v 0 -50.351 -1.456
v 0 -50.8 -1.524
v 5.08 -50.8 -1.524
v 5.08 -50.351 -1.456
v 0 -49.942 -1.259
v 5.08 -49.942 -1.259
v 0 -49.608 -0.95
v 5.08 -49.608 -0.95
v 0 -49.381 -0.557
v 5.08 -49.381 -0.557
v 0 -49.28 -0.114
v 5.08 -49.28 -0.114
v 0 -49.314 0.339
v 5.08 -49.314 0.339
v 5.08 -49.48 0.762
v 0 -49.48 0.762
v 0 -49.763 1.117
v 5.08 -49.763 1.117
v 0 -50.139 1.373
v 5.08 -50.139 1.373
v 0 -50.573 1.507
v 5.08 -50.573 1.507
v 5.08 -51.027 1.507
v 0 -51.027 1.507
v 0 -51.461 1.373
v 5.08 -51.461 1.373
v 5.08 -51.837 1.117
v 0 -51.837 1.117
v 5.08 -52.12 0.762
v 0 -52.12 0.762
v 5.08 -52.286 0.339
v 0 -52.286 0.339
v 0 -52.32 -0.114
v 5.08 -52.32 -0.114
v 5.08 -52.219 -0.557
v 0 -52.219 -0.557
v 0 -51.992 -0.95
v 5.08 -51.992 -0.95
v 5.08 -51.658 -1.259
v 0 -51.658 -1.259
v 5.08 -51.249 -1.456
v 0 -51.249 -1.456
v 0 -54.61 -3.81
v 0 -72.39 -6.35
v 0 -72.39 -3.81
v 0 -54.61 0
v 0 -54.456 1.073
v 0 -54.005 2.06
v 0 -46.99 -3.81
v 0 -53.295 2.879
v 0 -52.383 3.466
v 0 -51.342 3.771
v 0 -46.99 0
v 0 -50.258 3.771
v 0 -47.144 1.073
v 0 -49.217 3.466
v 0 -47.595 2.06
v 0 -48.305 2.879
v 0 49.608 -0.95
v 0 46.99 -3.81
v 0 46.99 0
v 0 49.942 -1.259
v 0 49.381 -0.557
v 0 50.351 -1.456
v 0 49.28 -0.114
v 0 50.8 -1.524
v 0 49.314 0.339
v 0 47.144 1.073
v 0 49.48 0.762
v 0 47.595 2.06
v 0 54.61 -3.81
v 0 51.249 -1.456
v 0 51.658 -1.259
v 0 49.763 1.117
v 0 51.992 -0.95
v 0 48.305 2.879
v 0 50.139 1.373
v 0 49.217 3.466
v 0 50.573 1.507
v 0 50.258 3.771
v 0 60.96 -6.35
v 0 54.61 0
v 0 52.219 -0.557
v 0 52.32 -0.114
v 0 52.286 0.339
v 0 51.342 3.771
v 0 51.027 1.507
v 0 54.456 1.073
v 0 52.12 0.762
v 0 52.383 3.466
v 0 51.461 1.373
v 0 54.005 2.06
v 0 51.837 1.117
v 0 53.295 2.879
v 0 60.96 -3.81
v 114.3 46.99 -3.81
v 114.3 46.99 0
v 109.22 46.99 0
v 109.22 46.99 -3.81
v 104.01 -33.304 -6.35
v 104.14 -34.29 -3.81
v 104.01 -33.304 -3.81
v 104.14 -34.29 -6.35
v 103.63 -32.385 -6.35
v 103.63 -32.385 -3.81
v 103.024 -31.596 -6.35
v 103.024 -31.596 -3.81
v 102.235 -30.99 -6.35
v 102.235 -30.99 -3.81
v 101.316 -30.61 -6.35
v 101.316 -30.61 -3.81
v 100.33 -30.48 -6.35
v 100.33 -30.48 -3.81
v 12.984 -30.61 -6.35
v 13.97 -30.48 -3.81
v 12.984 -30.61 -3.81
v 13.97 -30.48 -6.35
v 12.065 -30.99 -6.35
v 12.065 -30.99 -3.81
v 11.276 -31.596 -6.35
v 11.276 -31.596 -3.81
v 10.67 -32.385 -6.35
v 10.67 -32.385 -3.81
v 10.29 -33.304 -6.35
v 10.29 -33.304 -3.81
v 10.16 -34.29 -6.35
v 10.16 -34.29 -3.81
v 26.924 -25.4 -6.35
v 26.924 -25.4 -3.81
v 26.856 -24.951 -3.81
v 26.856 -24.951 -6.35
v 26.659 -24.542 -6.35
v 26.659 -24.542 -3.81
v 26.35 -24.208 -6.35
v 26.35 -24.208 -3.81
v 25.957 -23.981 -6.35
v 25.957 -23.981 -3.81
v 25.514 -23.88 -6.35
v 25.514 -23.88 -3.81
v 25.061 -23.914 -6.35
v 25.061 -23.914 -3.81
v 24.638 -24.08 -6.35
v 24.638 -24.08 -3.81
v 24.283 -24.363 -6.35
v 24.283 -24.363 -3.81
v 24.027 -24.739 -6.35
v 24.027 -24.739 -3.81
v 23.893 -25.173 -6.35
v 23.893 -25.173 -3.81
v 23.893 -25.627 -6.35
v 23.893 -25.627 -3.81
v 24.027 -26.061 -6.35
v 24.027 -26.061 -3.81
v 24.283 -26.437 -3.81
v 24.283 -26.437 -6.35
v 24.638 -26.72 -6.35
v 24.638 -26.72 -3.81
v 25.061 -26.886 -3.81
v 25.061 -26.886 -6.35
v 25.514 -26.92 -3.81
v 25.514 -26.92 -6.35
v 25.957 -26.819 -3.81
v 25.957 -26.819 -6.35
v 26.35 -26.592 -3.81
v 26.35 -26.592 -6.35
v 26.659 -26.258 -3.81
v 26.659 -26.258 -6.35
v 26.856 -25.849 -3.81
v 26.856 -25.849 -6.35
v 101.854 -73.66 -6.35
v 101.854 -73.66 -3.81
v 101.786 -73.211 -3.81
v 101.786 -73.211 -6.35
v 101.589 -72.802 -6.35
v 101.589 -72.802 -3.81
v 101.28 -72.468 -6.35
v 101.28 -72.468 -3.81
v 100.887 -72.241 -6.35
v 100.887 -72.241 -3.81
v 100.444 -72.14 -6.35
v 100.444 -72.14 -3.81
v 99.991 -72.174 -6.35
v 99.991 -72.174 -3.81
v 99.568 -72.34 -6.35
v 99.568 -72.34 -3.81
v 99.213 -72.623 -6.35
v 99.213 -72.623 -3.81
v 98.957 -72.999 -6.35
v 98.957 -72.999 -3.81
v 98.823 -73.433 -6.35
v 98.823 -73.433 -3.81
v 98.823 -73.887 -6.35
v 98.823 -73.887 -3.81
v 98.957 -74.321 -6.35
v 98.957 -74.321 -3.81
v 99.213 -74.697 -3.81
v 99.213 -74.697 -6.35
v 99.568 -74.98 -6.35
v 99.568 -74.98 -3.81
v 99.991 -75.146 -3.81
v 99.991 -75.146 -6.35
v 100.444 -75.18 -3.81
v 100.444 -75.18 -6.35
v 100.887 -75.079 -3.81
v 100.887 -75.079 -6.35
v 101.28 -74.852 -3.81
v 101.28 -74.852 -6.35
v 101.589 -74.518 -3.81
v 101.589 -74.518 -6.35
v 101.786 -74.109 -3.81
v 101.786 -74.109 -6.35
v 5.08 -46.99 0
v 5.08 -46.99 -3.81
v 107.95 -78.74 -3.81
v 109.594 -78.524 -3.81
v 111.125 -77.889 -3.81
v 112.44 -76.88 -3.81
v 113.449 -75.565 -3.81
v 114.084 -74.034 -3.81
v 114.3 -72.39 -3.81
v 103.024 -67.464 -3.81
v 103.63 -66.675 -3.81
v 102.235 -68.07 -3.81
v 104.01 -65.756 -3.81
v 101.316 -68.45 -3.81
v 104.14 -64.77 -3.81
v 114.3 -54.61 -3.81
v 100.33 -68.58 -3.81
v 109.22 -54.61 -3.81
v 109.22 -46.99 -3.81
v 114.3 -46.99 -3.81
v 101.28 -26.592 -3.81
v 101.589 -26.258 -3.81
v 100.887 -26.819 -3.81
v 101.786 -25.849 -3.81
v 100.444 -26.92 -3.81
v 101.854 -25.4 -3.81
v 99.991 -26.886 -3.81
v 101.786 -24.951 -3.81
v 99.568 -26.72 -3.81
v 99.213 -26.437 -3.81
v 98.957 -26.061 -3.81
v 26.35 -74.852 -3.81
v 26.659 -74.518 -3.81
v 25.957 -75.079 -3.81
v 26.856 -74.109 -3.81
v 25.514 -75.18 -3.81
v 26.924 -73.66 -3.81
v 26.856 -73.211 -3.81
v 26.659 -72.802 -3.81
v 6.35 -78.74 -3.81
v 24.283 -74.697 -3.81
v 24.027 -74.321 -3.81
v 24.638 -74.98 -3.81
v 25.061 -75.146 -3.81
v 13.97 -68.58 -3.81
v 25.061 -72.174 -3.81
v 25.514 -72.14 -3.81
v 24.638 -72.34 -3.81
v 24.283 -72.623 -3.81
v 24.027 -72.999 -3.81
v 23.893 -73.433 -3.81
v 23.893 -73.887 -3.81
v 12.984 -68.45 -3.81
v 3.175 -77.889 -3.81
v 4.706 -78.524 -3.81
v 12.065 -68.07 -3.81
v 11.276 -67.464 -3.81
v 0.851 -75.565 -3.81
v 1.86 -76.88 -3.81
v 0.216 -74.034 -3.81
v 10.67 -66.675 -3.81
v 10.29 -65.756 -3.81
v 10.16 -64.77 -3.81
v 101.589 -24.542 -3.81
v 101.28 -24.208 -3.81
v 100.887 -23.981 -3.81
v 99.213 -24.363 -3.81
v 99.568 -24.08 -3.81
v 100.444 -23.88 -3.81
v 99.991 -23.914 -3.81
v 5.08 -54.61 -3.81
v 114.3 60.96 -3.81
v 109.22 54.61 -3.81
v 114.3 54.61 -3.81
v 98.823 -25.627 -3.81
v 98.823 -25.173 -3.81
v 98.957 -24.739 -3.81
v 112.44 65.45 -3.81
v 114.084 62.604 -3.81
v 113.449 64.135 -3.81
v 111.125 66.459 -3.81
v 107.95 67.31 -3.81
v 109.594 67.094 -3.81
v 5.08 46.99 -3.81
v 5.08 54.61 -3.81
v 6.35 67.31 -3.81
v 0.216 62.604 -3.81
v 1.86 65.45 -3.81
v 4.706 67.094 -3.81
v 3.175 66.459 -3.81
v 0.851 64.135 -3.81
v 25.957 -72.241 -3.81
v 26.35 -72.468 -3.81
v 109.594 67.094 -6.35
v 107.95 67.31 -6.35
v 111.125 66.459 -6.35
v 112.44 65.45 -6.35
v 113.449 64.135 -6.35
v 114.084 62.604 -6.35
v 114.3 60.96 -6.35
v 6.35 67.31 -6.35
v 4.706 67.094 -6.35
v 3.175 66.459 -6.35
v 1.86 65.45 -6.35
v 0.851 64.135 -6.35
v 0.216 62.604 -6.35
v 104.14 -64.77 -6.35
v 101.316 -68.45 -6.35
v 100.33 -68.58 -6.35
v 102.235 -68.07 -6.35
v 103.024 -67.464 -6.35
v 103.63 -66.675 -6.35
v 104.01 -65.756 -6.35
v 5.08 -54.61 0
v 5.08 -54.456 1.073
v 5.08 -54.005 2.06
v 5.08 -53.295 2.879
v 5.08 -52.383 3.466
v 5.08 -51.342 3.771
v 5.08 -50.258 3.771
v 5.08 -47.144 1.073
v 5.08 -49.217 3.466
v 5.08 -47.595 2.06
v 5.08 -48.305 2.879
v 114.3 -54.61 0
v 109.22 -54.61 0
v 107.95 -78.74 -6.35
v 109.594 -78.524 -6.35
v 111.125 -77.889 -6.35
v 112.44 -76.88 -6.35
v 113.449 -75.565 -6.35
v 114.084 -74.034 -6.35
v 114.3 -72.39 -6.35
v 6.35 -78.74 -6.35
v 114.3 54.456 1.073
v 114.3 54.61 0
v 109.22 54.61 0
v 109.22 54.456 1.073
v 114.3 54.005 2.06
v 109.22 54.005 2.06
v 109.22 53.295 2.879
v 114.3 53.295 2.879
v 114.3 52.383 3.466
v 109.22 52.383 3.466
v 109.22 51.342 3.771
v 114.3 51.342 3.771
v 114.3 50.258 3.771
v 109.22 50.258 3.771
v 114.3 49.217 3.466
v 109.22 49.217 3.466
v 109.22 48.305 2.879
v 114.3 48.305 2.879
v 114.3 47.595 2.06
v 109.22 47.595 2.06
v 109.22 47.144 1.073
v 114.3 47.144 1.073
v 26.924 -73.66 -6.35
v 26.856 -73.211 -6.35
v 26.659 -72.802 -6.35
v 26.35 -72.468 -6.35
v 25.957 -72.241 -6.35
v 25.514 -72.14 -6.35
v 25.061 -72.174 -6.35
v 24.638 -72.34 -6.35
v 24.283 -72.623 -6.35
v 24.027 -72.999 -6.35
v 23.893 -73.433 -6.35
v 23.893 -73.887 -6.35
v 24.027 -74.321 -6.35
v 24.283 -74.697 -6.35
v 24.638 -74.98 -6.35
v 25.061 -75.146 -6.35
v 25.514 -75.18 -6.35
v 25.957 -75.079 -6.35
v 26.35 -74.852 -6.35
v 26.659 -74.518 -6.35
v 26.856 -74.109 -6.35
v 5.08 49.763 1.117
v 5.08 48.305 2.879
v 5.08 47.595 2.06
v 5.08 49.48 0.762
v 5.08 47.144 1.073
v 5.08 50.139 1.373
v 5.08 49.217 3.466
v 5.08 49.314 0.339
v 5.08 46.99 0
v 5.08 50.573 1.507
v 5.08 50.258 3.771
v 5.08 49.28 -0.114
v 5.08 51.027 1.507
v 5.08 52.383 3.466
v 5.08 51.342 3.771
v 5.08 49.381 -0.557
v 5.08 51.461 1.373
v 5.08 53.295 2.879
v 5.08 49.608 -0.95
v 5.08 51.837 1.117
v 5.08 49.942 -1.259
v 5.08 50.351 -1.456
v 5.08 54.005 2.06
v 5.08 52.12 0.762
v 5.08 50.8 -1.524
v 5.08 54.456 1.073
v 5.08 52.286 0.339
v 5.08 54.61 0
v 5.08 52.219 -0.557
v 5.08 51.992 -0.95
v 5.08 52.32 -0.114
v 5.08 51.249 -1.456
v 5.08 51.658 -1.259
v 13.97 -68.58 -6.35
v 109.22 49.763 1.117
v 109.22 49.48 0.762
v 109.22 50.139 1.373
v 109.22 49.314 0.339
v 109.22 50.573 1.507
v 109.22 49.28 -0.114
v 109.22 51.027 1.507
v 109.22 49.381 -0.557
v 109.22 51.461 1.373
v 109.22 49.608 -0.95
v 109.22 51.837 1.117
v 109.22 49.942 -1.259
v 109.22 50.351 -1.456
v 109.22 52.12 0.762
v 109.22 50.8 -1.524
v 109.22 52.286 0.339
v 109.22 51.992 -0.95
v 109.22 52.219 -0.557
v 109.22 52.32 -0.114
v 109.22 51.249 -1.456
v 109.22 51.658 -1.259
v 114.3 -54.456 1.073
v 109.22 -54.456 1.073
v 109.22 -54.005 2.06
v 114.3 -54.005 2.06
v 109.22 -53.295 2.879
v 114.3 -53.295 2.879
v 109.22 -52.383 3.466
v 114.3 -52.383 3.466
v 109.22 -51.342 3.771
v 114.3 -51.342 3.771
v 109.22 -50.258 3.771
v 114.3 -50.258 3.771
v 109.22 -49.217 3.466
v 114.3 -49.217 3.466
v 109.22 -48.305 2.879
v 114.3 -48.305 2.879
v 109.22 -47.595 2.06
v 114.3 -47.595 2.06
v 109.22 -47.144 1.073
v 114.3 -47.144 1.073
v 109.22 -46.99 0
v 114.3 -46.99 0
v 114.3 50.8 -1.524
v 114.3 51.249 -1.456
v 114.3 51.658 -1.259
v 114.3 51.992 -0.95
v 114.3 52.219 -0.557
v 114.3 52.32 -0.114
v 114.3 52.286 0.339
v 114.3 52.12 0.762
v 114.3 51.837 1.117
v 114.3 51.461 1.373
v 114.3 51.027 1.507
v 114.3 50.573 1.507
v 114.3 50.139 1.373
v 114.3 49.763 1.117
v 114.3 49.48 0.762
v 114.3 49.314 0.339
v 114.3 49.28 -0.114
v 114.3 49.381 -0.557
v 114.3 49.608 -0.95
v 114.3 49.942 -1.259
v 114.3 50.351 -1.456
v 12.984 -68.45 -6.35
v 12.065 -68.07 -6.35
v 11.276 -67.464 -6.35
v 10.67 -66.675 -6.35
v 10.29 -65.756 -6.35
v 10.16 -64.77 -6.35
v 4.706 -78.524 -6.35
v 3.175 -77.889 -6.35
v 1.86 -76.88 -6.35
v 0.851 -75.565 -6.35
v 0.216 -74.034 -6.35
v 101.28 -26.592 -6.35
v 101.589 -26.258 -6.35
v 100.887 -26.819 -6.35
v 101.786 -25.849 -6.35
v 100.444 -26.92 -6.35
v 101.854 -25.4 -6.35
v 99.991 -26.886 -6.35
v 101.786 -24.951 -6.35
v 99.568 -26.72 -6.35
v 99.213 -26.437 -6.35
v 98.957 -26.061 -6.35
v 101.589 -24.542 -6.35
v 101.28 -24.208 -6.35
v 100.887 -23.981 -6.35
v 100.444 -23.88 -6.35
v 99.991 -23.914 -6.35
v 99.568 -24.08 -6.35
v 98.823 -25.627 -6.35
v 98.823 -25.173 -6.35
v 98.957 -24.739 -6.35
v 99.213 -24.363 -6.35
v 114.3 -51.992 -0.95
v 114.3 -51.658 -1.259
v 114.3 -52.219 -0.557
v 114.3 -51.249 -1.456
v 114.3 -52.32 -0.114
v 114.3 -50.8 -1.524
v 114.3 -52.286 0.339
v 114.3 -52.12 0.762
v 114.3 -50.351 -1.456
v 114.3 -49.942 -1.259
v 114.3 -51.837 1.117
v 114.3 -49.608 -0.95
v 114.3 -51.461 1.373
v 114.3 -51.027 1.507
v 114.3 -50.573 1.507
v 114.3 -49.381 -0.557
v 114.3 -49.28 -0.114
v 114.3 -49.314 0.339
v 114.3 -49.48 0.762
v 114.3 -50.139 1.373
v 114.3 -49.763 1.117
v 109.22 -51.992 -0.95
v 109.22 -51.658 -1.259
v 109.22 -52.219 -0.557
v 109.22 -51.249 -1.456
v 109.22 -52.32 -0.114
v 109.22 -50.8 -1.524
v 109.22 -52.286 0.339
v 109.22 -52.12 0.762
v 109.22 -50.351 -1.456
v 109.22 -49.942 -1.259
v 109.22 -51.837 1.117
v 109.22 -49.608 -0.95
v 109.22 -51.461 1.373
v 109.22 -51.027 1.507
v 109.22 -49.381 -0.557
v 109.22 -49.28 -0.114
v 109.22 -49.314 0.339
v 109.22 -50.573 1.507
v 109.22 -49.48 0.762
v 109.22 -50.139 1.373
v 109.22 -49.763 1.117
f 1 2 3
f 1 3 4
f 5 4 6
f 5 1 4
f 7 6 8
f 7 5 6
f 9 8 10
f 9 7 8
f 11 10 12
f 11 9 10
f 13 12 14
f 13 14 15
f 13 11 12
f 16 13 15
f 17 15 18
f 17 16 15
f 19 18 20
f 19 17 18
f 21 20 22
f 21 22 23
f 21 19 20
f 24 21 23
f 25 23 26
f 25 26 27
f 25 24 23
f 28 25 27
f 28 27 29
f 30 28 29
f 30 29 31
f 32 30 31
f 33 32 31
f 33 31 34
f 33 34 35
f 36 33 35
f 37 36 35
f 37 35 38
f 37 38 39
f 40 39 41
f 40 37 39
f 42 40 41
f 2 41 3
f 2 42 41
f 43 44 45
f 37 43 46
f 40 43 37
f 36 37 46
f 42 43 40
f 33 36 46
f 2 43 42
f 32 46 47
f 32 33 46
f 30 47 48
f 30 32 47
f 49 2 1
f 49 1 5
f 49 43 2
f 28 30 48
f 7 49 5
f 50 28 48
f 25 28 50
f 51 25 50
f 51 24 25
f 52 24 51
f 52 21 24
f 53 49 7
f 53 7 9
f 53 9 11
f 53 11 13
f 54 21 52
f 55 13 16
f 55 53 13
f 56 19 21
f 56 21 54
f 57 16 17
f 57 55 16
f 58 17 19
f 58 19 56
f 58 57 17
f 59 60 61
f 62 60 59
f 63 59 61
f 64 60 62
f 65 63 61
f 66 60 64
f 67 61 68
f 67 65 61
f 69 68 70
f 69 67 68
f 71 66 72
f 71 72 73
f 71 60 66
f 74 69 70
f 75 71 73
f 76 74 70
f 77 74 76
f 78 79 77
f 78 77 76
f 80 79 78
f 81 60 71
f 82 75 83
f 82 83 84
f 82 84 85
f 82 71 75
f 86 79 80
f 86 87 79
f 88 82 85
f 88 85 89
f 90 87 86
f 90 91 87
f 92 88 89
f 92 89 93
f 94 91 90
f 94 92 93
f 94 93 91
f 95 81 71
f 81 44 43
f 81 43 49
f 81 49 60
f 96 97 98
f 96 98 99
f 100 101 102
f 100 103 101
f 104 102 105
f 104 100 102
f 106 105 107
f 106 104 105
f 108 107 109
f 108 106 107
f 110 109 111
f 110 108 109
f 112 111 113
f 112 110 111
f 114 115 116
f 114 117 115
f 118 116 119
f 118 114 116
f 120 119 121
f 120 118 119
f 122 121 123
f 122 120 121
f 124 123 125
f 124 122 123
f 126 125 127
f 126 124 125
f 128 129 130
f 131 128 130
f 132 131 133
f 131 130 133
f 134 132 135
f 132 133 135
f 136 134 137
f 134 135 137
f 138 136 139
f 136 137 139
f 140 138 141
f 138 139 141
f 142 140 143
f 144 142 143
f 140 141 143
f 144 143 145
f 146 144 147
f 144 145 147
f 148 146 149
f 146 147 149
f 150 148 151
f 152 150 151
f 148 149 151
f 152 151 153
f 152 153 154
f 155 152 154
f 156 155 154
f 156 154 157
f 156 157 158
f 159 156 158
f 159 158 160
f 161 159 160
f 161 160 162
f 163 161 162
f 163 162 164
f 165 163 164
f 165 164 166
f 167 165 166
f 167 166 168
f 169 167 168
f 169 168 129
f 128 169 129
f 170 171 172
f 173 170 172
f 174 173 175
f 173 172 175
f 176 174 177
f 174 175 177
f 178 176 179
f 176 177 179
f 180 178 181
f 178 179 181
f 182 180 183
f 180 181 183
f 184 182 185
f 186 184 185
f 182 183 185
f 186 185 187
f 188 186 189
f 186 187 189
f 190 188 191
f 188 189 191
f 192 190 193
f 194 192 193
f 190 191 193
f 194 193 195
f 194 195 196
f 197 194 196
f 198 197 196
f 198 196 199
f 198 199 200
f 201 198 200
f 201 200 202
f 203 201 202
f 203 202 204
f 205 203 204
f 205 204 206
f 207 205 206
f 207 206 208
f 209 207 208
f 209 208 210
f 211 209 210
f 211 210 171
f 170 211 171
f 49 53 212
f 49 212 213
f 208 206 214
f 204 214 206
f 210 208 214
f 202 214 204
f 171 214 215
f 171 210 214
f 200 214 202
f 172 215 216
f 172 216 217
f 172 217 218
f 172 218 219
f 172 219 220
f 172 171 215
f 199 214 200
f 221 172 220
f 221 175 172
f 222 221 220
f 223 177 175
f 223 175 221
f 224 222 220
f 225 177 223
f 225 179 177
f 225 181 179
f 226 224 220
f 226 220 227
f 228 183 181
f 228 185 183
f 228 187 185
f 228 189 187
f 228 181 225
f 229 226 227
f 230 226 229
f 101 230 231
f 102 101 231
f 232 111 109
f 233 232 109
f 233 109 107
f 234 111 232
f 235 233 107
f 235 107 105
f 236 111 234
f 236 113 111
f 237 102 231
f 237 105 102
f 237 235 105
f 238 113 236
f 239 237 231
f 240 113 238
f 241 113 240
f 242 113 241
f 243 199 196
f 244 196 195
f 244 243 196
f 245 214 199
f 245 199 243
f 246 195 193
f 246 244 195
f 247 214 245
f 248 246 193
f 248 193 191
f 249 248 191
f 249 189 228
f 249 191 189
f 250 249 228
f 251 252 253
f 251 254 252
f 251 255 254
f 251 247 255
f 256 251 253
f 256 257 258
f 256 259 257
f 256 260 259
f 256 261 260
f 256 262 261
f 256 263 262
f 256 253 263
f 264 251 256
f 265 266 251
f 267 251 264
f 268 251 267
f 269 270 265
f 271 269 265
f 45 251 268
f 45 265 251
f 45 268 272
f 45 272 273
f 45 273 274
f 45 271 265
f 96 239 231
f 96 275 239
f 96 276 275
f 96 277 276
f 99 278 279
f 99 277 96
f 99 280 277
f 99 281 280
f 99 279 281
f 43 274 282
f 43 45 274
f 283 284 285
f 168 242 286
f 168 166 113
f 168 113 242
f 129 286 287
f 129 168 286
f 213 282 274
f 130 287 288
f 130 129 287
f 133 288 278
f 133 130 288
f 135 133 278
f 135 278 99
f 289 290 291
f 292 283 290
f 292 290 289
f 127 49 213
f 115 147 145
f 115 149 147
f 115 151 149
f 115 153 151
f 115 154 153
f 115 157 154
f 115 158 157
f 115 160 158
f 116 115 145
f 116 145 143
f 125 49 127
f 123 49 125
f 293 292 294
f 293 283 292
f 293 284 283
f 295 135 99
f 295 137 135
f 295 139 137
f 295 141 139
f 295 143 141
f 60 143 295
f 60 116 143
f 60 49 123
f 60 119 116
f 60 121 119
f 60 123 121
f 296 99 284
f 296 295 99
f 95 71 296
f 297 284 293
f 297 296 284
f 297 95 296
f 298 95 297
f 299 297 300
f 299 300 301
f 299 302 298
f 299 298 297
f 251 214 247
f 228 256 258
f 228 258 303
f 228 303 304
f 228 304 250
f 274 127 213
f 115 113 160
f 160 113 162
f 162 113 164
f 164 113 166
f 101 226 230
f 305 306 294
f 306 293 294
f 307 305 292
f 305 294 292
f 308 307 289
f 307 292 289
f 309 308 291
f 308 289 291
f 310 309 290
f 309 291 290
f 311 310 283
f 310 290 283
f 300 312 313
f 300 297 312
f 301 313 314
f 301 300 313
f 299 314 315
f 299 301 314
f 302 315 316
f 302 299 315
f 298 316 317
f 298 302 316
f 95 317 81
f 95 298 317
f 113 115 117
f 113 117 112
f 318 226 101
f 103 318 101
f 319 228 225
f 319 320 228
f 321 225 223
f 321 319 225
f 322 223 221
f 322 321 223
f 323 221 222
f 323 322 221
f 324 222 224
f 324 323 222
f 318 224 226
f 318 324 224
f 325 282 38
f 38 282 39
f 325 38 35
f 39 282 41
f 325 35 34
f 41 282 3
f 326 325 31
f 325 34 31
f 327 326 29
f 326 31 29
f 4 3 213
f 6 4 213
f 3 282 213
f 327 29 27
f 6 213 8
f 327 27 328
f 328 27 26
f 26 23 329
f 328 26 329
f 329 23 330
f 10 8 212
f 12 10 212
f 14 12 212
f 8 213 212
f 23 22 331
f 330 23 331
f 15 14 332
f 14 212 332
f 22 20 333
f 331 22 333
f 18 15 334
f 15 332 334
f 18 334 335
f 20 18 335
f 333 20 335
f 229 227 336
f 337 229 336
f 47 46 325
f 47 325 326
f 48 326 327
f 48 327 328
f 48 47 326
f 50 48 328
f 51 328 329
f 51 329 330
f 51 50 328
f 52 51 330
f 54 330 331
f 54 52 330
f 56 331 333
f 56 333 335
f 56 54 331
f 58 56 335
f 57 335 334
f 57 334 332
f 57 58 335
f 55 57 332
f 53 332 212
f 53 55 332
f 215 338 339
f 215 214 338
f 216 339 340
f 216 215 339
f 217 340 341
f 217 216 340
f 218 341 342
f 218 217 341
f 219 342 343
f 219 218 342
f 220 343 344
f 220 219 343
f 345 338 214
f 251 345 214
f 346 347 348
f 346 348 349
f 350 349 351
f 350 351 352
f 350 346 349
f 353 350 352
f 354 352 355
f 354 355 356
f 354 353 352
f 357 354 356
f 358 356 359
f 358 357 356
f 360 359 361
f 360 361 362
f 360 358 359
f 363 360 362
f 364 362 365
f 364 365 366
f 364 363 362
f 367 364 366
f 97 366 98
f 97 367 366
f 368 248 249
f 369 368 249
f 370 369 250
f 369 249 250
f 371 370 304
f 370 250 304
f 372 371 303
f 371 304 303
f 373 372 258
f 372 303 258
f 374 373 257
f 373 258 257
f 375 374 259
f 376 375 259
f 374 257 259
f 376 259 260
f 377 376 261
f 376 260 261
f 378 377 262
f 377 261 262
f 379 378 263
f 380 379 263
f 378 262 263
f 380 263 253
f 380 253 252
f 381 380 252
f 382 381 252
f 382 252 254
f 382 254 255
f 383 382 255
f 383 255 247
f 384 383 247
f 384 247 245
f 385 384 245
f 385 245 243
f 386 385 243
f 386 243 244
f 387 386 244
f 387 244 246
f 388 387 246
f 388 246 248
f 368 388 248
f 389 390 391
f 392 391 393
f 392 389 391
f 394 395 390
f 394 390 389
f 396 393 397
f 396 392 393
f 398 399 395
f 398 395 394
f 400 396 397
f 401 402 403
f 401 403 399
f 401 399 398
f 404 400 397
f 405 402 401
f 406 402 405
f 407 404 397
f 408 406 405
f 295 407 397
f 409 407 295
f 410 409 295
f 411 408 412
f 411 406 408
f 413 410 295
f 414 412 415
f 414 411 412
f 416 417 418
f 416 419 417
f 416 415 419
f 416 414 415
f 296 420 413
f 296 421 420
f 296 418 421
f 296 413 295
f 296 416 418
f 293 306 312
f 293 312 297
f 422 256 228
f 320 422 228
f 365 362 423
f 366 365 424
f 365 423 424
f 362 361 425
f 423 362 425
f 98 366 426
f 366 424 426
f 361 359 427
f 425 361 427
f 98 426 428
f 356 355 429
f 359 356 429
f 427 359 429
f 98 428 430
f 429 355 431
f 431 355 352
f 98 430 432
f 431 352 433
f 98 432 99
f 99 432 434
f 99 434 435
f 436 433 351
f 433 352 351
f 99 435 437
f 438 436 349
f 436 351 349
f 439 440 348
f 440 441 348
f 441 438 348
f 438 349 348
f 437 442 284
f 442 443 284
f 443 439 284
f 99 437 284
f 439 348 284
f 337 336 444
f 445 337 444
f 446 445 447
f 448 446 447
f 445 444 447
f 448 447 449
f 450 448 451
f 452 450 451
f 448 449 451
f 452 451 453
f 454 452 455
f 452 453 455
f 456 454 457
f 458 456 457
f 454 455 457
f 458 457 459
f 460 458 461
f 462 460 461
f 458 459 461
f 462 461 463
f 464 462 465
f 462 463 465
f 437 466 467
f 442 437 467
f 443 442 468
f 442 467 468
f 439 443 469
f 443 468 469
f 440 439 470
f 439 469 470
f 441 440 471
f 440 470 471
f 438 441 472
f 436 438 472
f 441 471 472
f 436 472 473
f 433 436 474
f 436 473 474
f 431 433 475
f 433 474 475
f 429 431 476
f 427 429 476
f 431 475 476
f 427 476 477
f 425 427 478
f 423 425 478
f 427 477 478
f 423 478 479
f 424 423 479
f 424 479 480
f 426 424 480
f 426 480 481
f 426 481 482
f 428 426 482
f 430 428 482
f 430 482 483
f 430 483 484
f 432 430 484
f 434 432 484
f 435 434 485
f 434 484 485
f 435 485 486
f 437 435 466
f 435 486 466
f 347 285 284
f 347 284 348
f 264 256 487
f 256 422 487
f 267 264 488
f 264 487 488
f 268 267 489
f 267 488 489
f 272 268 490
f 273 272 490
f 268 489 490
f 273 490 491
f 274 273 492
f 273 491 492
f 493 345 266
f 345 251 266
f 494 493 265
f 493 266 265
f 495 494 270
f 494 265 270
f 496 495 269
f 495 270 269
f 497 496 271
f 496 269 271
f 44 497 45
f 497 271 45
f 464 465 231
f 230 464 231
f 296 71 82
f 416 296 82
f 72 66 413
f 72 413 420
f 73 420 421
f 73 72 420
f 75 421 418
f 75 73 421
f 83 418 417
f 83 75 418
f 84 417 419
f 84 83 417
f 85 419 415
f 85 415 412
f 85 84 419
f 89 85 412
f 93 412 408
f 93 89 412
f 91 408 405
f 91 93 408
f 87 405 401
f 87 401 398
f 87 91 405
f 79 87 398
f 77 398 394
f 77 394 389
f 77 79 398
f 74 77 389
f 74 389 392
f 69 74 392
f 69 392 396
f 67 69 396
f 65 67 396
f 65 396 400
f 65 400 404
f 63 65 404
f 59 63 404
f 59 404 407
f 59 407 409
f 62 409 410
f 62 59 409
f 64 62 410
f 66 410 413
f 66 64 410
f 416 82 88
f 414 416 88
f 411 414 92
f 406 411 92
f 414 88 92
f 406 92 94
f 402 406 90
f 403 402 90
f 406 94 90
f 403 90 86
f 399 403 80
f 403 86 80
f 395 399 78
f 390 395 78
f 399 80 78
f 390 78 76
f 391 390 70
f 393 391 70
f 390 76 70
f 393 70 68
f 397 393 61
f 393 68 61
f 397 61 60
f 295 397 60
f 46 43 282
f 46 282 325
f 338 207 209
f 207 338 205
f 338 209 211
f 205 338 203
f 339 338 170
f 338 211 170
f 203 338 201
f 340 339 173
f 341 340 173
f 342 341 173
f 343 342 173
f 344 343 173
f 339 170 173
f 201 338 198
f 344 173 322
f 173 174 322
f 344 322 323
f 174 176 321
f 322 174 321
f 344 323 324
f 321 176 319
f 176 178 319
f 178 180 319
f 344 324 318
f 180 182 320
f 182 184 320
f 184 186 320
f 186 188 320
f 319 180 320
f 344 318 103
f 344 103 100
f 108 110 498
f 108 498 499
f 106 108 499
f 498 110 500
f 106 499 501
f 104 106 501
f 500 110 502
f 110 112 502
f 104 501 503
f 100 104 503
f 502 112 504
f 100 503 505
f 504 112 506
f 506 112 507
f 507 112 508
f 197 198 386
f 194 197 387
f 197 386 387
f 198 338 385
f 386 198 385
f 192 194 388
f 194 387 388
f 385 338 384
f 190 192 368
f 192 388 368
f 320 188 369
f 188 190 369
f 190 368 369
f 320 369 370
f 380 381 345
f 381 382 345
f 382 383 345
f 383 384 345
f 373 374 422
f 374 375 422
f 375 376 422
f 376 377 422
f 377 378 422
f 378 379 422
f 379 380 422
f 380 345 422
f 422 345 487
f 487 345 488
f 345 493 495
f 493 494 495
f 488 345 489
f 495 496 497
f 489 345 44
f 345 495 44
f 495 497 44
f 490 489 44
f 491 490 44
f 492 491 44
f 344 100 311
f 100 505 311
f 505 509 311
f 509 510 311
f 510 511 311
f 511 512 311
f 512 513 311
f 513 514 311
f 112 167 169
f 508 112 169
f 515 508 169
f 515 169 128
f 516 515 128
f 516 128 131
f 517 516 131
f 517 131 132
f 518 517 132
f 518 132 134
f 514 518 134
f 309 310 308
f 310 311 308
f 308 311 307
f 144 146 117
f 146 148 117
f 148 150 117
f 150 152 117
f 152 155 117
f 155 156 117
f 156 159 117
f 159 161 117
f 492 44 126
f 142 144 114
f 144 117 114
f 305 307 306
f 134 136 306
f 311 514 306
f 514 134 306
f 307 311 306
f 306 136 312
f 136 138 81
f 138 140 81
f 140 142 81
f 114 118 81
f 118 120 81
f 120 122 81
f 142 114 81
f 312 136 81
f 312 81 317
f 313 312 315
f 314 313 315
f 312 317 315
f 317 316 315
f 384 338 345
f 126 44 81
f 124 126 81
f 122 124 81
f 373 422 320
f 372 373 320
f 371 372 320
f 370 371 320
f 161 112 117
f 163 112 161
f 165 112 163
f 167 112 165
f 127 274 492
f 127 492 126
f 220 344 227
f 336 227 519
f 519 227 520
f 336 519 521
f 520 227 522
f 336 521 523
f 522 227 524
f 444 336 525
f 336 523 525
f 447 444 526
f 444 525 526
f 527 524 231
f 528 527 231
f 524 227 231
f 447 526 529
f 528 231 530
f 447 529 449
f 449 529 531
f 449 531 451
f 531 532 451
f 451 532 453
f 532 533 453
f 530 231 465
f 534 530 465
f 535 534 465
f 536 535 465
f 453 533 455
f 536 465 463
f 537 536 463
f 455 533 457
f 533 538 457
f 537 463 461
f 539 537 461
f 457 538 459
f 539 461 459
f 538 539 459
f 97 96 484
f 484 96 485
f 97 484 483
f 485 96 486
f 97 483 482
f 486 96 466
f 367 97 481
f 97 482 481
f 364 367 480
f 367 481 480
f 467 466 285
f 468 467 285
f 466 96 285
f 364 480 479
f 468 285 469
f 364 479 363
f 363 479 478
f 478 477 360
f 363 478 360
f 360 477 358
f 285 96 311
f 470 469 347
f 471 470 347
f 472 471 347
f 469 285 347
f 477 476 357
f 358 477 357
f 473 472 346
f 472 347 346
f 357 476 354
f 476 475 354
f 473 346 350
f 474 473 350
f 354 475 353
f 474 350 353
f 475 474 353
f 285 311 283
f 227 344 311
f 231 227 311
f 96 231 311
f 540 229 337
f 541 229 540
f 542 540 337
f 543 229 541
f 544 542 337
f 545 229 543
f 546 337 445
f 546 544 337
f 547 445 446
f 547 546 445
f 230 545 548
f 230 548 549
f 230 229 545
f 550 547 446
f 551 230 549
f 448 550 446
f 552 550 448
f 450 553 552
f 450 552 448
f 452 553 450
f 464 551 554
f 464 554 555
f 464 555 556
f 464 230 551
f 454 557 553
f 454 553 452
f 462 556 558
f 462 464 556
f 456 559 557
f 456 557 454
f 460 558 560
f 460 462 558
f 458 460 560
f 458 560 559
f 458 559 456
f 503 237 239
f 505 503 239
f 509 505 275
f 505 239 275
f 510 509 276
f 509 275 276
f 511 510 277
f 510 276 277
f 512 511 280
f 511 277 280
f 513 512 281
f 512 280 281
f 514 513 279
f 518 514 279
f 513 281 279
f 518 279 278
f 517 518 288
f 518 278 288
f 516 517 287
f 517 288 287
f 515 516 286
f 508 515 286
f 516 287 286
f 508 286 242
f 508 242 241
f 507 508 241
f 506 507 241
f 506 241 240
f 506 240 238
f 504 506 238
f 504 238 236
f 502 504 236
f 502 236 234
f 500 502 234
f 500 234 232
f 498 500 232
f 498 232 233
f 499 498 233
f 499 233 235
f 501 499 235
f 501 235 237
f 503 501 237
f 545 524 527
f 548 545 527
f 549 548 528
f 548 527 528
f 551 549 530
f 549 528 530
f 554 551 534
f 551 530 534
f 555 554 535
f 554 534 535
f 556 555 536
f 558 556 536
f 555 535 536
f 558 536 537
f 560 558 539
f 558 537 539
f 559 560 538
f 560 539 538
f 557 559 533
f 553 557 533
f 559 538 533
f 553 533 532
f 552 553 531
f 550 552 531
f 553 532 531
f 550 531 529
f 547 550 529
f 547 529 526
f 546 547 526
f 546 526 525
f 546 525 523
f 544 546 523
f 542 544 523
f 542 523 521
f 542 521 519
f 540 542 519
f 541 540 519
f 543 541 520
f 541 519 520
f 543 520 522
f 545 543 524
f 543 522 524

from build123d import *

# Parameters (mm, degrees)
SKETCH1_R                        = 1.524
SCREW_HOLES_DEPTH                = 5.08
SCREW_HOLES_2_DEPTH              = 5.08
SKETCH2_W                        = 2.54
SKETCH2_H                        = 146.05
MAIN_EXTRUDE_DEPTH               = 114.3
FILLET1_R                        = 6.35
SKETCH3_R                        = 1.524
COMPONENT_MOUNT_HOLES_DEPTH      = 8.62
COMPONENT_MOUNT_HOLES_DEPTH_BACK = 3.54
SKETCH4_W                        = 93.98
SKETCH4_H                        = 38.1
WEIGHT_REDUCTION_DEPTH           = 8.62
WEIGHT_REDUCTION_DEPTH_BACK      = 3.54
FILLET2_R                        = 3.81


with BuildPart() as part:
    # Sketch1 → Screw holes (new body)
    with BuildSketch(Plane(origin=(0, 0, 0), x_dir=(0, 0, -1), z_dir=(1, 0, 0))):
        with BuildLine():
            Line((0, 46.99), (3.81, 46.99))
            Line((3.81, 46.99), (3.81, 54.61))
            Line((3.81, 54.61), (0, 54.61))
            ThreePointArc((0, 54.61), (-3.81, 50.8), (0, 46.99))
        make_face()
        with Locations((0, 50.8)):
            Circle(SKETCH1_R, mode=Mode.SUBTRACT)
    screw_holes = extrude(amount=SCREW_HOLES_DEPTH)



with BuildPart() as body_2:
    # Sketch1 → Screw holes 2 (new body)
    with BuildSketch(Plane(origin=(0, 0, 0), x_dir=(0, 0, -1), z_dir=(1, 0, 0))):
        with BuildLine():
            Line((3.81, -54.61), (0, -54.61))
            ThreePointArc((0, -54.61), (-3.81, -50.8), (0, -46.99))
            Line((0, -46.99), (3.81, -46.99))
            Line((3.81, -46.99), (3.81, -54.61))
        make_face()
        with Locations((0, -50.8)):
            Circle(SKETCH1_R, mode=Mode.SUBTRACT)
    screw_holes_2 = extrude(amount=SCREW_HOLES_2_DEPTH)


with BuildPart() as part_1:
    add(part.part)

    add(body_2.part)  # Main extrude merges body 2
    # Sketch2 → Main extrude (add)
    with BuildSketch(Plane.ZY):
        with Locations((-5.08, -5.715)):
            Rectangle(SKETCH2_W, SKETCH2_H)
    extrude(amount=-MAIN_EXTRUDE_DEPTH)

    # Screw holes 2 2: Screw holes, Screw holes 2 across plane
    add(screw_holes.mirror(Plane.ZY.offset(-57.15)))
    add(screw_holes_2.mirror(Plane.ZY.offset(-57.15)))

    # Fillet1
    fillet1_edges = [part_1.edges().sort_by_distance(p)[0] for p in [
        (114.3, -78.74, -5.08),
        (114.3, 67.31, -5.08),
        (0, 67.31, -5.08),
        (0, -78.74, -5.08),
    ]]
    fillet(fillet1_edges, radius=FILLET1_R)

    # Sketch3 → Component mount holes (cut, two sides)
    with BuildSketch(Plane.XY.offset(-3.81)) as component_mount_holes_sk:
        with Locations((25.4, -25.4)):
            Circle(SKETCH3_R)
        with Locations((100.33, -25.4)):
            Circle(SKETCH3_R)
        with Locations((100.33, -73.66)):
            Circle(SKETCH3_R)
        with Locations((25.4, -73.66)):
            Circle(SKETCH3_R)
    extrude(amount=COMPONENT_MOUNT_HOLES_DEPTH, mode=Mode.SUBTRACT)
    extrude(component_mount_holes_sk.sketch, amount=-COMPONENT_MOUNT_HOLES_DEPTH_BACK, mode=Mode.SUBTRACT)

    # Sketch4 → Weight reduction (cut, two sides)
    with BuildSketch(Plane.XY.offset(-3.81)) as weight_reduction_sk:
        with Locations((57.15, -49.53)):
            Rectangle(SKETCH4_W, SKETCH4_H)
    extrude(amount=WEIGHT_REDUCTION_DEPTH, mode=Mode.SUBTRACT)
    extrude(weight_reduction_sk.sketch, amount=-WEIGHT_REDUCTION_DEPTH_BACK, mode=Mode.SUBTRACT)

    # Fillet2
    fillet2_edges = [part_1.edges().sort_by_distance(p)[0] for p in [
        (10.16, -68.58, -5.08),
        (10.16, -30.48, -5.08),
        (104.14, -30.48, -5.08),
        (104.14, -68.58, -5.08),
    ]]
    fillet(fillet2_edges, radius=FILLET2_R)


solid = part_1.part
